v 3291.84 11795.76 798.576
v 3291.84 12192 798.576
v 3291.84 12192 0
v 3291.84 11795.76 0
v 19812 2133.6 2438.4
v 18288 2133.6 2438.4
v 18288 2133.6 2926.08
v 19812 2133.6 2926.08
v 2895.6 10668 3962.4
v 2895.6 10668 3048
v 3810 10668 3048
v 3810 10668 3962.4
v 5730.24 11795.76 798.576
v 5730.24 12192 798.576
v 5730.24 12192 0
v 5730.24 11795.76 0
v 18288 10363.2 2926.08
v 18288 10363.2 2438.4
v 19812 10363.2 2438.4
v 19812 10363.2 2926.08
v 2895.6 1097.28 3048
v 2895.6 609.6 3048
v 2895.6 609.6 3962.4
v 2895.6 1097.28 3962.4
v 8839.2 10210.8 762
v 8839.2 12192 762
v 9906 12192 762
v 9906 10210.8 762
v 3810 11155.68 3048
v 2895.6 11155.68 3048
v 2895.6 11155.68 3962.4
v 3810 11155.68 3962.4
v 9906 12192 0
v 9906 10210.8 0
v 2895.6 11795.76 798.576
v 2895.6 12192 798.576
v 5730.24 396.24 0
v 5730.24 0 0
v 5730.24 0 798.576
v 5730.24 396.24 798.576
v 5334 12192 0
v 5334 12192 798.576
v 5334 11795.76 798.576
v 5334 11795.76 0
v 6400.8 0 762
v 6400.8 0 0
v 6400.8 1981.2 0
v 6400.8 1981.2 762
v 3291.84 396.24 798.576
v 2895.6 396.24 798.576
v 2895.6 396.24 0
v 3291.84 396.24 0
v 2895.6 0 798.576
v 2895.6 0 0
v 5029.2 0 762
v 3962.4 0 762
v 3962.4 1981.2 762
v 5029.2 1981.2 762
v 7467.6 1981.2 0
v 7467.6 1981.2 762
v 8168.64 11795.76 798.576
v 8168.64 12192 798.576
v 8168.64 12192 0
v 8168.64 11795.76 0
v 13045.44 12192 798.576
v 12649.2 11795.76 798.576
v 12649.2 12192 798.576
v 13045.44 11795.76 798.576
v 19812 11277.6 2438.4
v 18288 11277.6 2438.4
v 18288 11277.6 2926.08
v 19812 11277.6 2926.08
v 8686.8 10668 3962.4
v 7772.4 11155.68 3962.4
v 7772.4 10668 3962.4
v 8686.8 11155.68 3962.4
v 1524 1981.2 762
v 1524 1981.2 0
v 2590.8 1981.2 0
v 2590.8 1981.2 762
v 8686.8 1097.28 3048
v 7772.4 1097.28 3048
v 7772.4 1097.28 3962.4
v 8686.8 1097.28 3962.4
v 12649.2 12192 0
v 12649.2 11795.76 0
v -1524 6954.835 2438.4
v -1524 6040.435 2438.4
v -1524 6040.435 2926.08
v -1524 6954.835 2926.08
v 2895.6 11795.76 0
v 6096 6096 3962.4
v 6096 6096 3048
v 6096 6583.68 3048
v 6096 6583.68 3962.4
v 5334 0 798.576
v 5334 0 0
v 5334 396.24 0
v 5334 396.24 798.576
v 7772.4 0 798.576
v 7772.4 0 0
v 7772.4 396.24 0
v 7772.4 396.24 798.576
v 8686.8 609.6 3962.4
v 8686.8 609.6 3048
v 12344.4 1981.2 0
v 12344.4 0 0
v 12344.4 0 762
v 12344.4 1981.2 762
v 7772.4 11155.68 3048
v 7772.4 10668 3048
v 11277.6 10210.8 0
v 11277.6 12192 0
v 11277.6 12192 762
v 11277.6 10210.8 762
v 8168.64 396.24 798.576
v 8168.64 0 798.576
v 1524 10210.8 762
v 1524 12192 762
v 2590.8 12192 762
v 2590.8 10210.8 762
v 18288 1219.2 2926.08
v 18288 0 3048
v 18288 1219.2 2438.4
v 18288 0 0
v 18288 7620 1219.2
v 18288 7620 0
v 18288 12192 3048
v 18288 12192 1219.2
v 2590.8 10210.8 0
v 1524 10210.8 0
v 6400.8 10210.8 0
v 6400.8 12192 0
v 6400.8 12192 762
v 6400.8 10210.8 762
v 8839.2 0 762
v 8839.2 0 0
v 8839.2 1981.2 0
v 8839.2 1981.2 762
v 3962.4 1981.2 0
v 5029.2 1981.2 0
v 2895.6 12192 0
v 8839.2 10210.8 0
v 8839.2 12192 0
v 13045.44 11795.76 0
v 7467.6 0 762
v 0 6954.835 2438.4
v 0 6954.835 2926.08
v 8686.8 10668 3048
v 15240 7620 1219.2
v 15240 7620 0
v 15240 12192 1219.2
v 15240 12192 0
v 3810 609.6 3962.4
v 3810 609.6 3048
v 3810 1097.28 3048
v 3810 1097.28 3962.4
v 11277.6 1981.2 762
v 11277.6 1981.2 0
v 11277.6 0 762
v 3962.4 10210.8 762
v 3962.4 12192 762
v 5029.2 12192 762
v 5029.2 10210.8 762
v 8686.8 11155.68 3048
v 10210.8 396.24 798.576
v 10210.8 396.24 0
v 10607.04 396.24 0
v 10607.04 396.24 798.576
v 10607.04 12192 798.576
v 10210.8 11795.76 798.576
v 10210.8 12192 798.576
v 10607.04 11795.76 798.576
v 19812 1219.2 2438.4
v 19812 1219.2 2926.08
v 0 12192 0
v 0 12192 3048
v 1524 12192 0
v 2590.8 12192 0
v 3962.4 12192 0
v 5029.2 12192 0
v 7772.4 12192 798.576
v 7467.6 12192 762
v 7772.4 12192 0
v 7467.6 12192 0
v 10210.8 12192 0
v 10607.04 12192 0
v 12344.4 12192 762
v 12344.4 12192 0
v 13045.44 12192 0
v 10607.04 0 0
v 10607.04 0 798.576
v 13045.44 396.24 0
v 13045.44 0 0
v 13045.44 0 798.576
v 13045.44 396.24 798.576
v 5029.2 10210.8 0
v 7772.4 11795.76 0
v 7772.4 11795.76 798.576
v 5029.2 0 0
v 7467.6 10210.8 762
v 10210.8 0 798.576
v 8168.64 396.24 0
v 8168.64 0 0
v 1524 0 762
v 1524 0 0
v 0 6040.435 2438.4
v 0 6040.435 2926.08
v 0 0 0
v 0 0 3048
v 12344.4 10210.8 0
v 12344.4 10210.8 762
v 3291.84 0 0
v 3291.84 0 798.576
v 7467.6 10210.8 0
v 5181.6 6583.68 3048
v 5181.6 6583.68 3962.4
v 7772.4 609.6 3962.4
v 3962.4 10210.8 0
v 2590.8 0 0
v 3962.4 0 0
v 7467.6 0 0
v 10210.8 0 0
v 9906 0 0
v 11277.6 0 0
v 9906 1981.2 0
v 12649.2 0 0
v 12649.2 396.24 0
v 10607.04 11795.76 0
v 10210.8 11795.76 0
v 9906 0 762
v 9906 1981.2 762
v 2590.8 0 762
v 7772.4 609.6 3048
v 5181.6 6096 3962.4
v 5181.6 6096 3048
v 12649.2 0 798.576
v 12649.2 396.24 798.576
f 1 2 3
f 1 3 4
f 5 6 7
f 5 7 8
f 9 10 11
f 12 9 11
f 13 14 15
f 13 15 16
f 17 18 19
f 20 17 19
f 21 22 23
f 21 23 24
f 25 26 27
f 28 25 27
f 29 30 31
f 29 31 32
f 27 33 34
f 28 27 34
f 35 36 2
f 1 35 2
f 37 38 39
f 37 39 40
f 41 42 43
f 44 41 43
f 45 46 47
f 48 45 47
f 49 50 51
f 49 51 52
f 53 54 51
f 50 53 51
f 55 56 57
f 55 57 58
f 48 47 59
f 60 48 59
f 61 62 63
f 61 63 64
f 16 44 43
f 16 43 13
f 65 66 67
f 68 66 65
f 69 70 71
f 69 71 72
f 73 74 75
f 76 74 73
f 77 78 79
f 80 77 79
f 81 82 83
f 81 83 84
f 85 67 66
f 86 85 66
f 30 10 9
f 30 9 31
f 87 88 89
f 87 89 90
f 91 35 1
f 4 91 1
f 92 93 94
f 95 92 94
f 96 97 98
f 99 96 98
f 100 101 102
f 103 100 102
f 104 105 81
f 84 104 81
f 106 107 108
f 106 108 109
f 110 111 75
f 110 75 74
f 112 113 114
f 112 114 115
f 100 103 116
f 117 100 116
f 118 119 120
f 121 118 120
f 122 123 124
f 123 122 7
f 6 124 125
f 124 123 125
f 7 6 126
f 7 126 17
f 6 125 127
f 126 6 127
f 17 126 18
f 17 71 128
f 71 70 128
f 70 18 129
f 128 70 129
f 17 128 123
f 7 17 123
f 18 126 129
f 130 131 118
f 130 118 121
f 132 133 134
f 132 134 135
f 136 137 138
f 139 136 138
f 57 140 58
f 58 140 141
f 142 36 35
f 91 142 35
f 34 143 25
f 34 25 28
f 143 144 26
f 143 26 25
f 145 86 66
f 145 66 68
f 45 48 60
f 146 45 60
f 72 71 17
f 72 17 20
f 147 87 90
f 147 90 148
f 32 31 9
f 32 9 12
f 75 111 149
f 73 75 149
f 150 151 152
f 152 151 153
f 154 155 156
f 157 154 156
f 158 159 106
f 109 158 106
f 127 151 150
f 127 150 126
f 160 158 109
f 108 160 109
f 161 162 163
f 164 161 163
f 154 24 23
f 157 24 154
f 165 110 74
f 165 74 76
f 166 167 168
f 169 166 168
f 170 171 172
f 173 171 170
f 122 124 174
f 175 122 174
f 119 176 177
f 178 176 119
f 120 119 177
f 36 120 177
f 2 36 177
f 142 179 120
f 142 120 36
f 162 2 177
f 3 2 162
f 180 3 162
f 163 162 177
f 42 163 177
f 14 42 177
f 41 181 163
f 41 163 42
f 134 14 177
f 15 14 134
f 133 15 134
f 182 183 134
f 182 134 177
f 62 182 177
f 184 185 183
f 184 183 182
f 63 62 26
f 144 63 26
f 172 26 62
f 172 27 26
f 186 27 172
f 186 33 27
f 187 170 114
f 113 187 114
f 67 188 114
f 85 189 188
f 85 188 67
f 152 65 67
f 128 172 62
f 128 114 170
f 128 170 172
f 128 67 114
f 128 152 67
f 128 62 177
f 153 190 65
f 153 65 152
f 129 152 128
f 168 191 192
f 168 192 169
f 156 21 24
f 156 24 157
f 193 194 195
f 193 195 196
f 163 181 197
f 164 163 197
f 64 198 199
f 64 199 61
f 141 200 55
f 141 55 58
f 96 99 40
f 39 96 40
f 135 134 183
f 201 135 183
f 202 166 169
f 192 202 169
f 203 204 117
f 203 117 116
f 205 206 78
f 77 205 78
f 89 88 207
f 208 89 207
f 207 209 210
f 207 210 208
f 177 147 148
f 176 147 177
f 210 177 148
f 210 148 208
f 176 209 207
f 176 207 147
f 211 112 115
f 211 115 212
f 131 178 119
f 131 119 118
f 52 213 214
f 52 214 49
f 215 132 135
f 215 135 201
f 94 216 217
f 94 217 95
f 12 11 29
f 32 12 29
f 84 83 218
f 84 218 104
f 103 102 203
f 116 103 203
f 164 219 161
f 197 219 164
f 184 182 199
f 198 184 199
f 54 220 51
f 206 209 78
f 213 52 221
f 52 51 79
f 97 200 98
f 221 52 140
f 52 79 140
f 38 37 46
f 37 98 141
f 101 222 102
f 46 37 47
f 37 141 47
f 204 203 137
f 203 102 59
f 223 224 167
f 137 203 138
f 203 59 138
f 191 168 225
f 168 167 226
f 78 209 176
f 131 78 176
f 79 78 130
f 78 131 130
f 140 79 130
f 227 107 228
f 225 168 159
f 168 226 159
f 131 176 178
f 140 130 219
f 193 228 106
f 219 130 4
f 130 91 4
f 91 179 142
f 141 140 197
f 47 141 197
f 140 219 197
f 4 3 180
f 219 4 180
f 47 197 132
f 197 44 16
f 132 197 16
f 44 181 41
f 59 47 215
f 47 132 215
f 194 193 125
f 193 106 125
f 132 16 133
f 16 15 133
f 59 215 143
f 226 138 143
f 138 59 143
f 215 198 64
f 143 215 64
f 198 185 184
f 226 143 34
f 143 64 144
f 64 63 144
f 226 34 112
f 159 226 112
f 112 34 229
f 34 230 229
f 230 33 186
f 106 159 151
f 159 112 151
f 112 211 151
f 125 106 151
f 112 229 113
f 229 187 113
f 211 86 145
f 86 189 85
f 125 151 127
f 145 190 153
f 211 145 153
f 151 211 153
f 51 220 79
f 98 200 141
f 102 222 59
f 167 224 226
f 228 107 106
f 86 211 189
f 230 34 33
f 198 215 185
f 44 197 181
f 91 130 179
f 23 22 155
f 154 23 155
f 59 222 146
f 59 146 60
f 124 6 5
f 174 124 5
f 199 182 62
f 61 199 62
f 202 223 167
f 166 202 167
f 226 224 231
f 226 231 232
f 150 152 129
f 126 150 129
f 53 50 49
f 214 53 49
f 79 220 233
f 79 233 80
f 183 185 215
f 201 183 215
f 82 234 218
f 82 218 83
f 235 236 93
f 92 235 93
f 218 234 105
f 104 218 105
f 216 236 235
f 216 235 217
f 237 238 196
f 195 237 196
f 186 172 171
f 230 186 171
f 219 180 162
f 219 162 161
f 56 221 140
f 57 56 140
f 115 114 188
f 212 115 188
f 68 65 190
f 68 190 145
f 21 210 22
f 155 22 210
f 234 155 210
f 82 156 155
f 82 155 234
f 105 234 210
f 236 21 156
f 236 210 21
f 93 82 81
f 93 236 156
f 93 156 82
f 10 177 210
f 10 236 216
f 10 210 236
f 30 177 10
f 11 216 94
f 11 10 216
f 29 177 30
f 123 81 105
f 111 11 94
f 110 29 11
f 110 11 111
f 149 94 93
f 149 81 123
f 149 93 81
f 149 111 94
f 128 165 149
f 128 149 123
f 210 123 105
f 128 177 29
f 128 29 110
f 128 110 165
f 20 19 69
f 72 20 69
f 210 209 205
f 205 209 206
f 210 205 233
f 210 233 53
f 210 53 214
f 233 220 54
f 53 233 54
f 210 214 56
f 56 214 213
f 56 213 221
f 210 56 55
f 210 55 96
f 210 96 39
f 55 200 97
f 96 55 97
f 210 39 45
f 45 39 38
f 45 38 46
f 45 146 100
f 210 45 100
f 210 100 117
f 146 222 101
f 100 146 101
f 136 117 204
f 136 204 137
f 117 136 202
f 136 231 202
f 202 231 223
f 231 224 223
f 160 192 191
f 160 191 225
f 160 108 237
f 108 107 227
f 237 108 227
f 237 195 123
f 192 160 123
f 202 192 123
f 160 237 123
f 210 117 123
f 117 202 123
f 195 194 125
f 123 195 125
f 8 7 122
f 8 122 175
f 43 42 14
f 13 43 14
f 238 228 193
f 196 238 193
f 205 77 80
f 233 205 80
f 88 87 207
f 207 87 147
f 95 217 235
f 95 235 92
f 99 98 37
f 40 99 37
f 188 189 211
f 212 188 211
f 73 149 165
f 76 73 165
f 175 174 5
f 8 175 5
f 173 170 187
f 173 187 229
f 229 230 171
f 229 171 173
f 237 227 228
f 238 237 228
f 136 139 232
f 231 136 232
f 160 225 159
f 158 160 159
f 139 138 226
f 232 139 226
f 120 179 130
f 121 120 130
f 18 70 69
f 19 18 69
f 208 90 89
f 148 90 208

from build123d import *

# Parameters (mm, degrees)
BOX011_W     = 3048
BOX011_H     = 4572
BOX011_DEPTH = 1219.2
BOX006_W     = 1066.8
BOX006_H     = 1981.2
BOX006_DEPTH = 762
BOX005_W     = 396.24
BOX005_H     = 396.24
BOX005_DEPTH = 798.576
BOX007_W     = 1066.8
BOX007_H     = 1981.2
BOX007_DEPTH = 762
BOX008_W     = 396.24
BOX008_H     = 396.24
BOX008_DEPTH = 798.576
BOX010_W     = 1066.8
BOX010_H     = 1981.2
BOX010_DEPTH = 762
BOX009_W     = 396.24
BOX009_H     = 396.24
BOX009_DEPTH = 798.576
BOX001_W     = 1066.8
BOX001_H     = 1981.2
BOX001_DEPTH = 762
BOX002_W     = 396.24
BOX002_H     = 396.24
BOX002_DEPTH = 798.576
BOX003_W     = 1066.8
BOX003_H     = 1981.2
BOX003_DEPTH = 762
BOX004_W     = 396.24
BOX004_H     = 396.24
BOX004_DEPTH = 798.576
BOX017_W     = 914.4
BOX017_H     = 487.68
BOX017_DEPTH = 1219.2
BOX018_W     = 914.4
BOX018_H     = 487.68
BOX018_DEPTH = 1219.2
BOX019_W     = 914.4
BOX019_H     = 487.68
BOX019_DEPTH = 1219.2
BOX021_W     = 914.4
BOX021_H     = 487.68
BOX021_DEPTH = 1219.2
BOX016_W     = 914.4
BOX016_H     = 487.68
BOX016_DEPTH = 1219.2
BOX012_W     = 2438.4
BOX012_H     = 914.4
BOX012_DEPTH = 487.68
BOX013_W     = 2438.4
BOX013_H     = 914.4
BOX013_DEPTH = 487.68
BOX020_W     = 2438.4
BOX020_H     = 914.4
BOX020_DEPTH = 487.68
BOX_W        = 18288
BOX_H        = 12192
BOX_DEPTH    = 3048


with BuildPart() as nurse_station:
    # Box011 → Box011 (new body)
    with BuildSketch(Plane(origin=(15240, 7620, 0), x_dir=(1, 0, 0), z_dir=(0, 0, 1))):
        with Locations((1524, 2286)):
            Rectangle(BOX011_W, BOX011_H)
    extrude(amount=BOX011_DEPTH)


with BuildPart() as box006:
    # Box006 → Box006 (new body)
    with BuildSketch(Plane.XY):
        with Locations((533.4, 990.6)):
            Rectangle(BOX006_W, BOX006_H)
    extrude(amount=BOX006_DEPTH)


with BuildPart() as fusion002:
    # Box005 → Box005 (new body)
    with BuildSketch(Plane(origin=(1371.6, 0, 0), x_dir=(1, 0, 0), z_dir=(0, 0, 1))):
        with Locations((198.12, 198.12)):
            Rectangle(BOX005_W, BOX005_H)
    extrude(amount=BOX005_DEPTH)

    # Fusion002: union Box006
    add(box006.part)


with BuildPart() as fusion002_1:
    # Fusion002 placement: moved
    add(fusion002.part.moved(Location((4876.8, 0, 0))))


with BuildPart() as box007:
    # Box007 → Box007 (new body)
    with BuildSketch(Plane.XY):
        with Locations((533.4, 990.6)):
            Rectangle(BOX007_W, BOX007_H)
    extrude(amount=BOX007_DEPTH)


with BuildPart() as fusion003:
    # Box008 → Box008 (new body)
    with BuildSketch(Plane(origin=(1371.6, 0, 0), x_dir=(1, 0, 0), z_dir=(0, 0, 1))):
        with Locations((198.12, 198.12)):
            Rectangle(BOX008_W, BOX008_H)
    extrude(amount=BOX008_DEPTH)

    # Fusion003: union Box007
    add(box007.part)


with BuildPart() as fusion003_1:
    # Fusion003 placement: moved
    add(fusion003.part.moved(Location((7315.2, 0, 0))))


with BuildPart() as box010:
    # Box010 → Box010 (new body)
    with BuildSketch(Plane.XY):
        with Locations((533.4, 990.6)):
            Rectangle(BOX010_W, BOX010_H)
    extrude(amount=BOX010_DEPTH)


with BuildPart() as fusion004:
    # Box009 → Box009 (new body)
    with BuildSketch(Plane(origin=(1371.6, 0, 0), x_dir=(1, 0, 0), z_dir=(0, 0, 1))):
        with Locations((198.12, 198.12)):
            Rectangle(BOX009_W, BOX009_H)
    extrude(amount=BOX009_DEPTH)

    # Fusion004: union Box010
    add(box010.part)


with BuildPart() as fusion004_1:
    # Fusion004 placement: moved
    add(fusion004.part.moved(Location((9753.6, 0, 0))))


with BuildPart() as box001:
    # Box001 → Box001 (new body)
    with BuildSketch(Plane.XY):
        with Locations((533.4, 990.6)):
            Rectangle(BOX001_W, BOX001_H)
    extrude(amount=BOX001_DEPTH)


with BuildPart() as fusion:
    # Box002 → Box002 (new body)
    with BuildSketch(Plane(origin=(1371.6, 0, 0), x_dir=(1, 0, 0), z_dir=(0, 0, 1))):
        with Locations((198.12, 198.12)):
            Rectangle(BOX002_W, BOX002_H)
    extrude(amount=BOX002_DEPTH)

    # Fusion: union Box001
    add(box001.part)


with BuildPart() as box003:
    # Box003 → Box003 (new body)
    with BuildSketch(Plane.XY):
        with Locations((533.4, 990.6)):
            Rectangle(BOX003_W, BOX003_H)
    extrude(amount=BOX003_DEPTH)


with BuildPart() as right_beds:
    # Box004 → Box004 (new body)
    with BuildSketch(Plane(origin=(1371.6, 0, 0), x_dir=(1, 0, 0), z_dir=(0, 0, 1))):
        with Locations((198.12, 198.12)):
            Rectangle(BOX004_W, BOX004_H)
    extrude(amount=BOX004_DEPTH)

    # Fusion001: union Box003
    add(box003.part)


with BuildPart() as right_beds_1:
    # Fusion001 placement: moved
    add(right_beds.part.moved(Location((2438.4, 0, 0))))

    # Fusion005: union Fusion002, Fusion003, Fusion004, Fusion
    add(fusion002_1.part)
    add(fusion003_1.part)
    add(fusion004_1.part)
    add(fusion.part)


with BuildPart() as surfaces:
    # Part__Mirroring: instance of right beds
    add(right_beds_1.part.mirror(Plane(origin=(0, 6096, 0), x_dir=(1, 0, 0), z_dir=(0, 1, 0))))

    # Fusion006: union right beds
    add(right_beds_1.part)


with BuildPart() as surfaces_1:
    # Fusion006 placement: moved
    add(surfaces.part.moved(Location((1524, 0, 0))))

    # Fusion010: union Nurse Station
    add(nurse_station.part)


with BuildPart() as branch003:
    # Box017 → Box017 (new body)
    with BuildSketch(Plane(origin=(7772.4, 10668, 2743.2), x_dir=(1, 0, 0), z_dir=(0, 0, 1))):
        with Locations((457.2, 243.84)):
            Rectangle(BOX017_W, BOX017_H)
    extrude(amount=BOX017_DEPTH)


with BuildPart() as branch004:
    # Box018 → Box018 (new body)
    with BuildSketch(Plane(origin=(2895.6, 609.6, 2743.2), x_dir=(1, 0, 0), z_dir=(0, 0, 1))):
        with Locations((457.2, 243.84)):
            Rectangle(BOX018_W, BOX018_H)
    extrude(amount=BOX018_DEPTH)


with BuildPart() as branch005:
    # Box019 → Box019 (new body)
    with BuildSketch(Plane(origin=(2895.6, 10668, 2743.2), x_dir=(1, 0, 0), z_dir=(0, 0, 1))):
        with Locations((457.2, 243.84)):
            Rectangle(BOX019_W, BOX019_H)
    extrude(amount=BOX019_DEPTH)


with BuildPart() as branch006:
    # Box021 → Box021 (new body)
    with BuildSketch(Plane(origin=(5181.6, 6096, 2743.2), x_dir=(1, 0, 0), z_dir=(0, 0, 1))):
        with Locations((457.2, 243.84)):
            Rectangle(BOX021_W, BOX021_H)
    extrude(amount=BOX021_DEPTH)


with BuildPart() as fusion013:
    # Box016 → Box016 (new body)
    with BuildSketch(Plane(origin=(7772.4, 609.6, 2743.2), x_dir=(1, 0, 0), z_dir=(0, 0, 1))):
        with Locations((457.2, 243.84)):
            Rectangle(BOX016_W, BOX016_H)
    extrude(amount=BOX016_DEPTH)

    # Fusion013: union branch003, branch004, branch005, branch006
    add(branch003.part)
    add(branch004.part)
    add(branch005.part)
    add(branch006.part)


with BuildPart() as main_inlet:
    # Box012 → Box012 (new body)
    with BuildSketch(Plane(origin=(17373.6, 1219.2, 2438.4), x_dir=(1, 0, 0), z_dir=(0, 0, 1))):
        with Locations((1219.2, 457.2)):
            Rectangle(BOX012_W, BOX012_H)
    extrude(amount=BOX012_DEPTH)


with BuildPart() as main_outlet:
    # Box013 → Box013 (new body)
    with BuildSketch(Plane(origin=(-1524, 6040.43496, 2438.4), x_dir=(1, 0, 0), z_dir=(0, 0, 1))):
        with Locations((1219.2, 457.2)):
            Rectangle(BOX013_W, BOX013_H)
    extrude(amount=BOX013_DEPTH)


with BuildPart() as fusion014:
    # Box020 → Box020 (new body)
    with BuildSketch(Plane(origin=(17373.6, 10363.2, 2438.4), x_dir=(1, 0, 0), z_dir=(0, 0, 1))):
        with Locations((1219.2, 457.2)):
            Rectangle(BOX020_W, BOX020_H)
    extrude(amount=BOX020_DEPTH)

    # Fusion012: union main inlet, main outlet
    add(main_inlet.part)
    add(main_outlet.part)

    # Fusion014: union Fusion013
    add(fusion013.part)


with BuildPart() as cut:
    # Box → Box (new body)
    with BuildSketch(Plane.XY):
        with Locations((9144, 6096)):
            Rectangle(BOX_W, BOX_H)
    extrude(amount=BOX_DEPTH)

    # Fusion015: union Fusion014
    add(fusion014.part)

    # Cut: cut surfaces
    add(surfaces_1.part, mode=Mode.SUBTRACT)


solid = cut.part
